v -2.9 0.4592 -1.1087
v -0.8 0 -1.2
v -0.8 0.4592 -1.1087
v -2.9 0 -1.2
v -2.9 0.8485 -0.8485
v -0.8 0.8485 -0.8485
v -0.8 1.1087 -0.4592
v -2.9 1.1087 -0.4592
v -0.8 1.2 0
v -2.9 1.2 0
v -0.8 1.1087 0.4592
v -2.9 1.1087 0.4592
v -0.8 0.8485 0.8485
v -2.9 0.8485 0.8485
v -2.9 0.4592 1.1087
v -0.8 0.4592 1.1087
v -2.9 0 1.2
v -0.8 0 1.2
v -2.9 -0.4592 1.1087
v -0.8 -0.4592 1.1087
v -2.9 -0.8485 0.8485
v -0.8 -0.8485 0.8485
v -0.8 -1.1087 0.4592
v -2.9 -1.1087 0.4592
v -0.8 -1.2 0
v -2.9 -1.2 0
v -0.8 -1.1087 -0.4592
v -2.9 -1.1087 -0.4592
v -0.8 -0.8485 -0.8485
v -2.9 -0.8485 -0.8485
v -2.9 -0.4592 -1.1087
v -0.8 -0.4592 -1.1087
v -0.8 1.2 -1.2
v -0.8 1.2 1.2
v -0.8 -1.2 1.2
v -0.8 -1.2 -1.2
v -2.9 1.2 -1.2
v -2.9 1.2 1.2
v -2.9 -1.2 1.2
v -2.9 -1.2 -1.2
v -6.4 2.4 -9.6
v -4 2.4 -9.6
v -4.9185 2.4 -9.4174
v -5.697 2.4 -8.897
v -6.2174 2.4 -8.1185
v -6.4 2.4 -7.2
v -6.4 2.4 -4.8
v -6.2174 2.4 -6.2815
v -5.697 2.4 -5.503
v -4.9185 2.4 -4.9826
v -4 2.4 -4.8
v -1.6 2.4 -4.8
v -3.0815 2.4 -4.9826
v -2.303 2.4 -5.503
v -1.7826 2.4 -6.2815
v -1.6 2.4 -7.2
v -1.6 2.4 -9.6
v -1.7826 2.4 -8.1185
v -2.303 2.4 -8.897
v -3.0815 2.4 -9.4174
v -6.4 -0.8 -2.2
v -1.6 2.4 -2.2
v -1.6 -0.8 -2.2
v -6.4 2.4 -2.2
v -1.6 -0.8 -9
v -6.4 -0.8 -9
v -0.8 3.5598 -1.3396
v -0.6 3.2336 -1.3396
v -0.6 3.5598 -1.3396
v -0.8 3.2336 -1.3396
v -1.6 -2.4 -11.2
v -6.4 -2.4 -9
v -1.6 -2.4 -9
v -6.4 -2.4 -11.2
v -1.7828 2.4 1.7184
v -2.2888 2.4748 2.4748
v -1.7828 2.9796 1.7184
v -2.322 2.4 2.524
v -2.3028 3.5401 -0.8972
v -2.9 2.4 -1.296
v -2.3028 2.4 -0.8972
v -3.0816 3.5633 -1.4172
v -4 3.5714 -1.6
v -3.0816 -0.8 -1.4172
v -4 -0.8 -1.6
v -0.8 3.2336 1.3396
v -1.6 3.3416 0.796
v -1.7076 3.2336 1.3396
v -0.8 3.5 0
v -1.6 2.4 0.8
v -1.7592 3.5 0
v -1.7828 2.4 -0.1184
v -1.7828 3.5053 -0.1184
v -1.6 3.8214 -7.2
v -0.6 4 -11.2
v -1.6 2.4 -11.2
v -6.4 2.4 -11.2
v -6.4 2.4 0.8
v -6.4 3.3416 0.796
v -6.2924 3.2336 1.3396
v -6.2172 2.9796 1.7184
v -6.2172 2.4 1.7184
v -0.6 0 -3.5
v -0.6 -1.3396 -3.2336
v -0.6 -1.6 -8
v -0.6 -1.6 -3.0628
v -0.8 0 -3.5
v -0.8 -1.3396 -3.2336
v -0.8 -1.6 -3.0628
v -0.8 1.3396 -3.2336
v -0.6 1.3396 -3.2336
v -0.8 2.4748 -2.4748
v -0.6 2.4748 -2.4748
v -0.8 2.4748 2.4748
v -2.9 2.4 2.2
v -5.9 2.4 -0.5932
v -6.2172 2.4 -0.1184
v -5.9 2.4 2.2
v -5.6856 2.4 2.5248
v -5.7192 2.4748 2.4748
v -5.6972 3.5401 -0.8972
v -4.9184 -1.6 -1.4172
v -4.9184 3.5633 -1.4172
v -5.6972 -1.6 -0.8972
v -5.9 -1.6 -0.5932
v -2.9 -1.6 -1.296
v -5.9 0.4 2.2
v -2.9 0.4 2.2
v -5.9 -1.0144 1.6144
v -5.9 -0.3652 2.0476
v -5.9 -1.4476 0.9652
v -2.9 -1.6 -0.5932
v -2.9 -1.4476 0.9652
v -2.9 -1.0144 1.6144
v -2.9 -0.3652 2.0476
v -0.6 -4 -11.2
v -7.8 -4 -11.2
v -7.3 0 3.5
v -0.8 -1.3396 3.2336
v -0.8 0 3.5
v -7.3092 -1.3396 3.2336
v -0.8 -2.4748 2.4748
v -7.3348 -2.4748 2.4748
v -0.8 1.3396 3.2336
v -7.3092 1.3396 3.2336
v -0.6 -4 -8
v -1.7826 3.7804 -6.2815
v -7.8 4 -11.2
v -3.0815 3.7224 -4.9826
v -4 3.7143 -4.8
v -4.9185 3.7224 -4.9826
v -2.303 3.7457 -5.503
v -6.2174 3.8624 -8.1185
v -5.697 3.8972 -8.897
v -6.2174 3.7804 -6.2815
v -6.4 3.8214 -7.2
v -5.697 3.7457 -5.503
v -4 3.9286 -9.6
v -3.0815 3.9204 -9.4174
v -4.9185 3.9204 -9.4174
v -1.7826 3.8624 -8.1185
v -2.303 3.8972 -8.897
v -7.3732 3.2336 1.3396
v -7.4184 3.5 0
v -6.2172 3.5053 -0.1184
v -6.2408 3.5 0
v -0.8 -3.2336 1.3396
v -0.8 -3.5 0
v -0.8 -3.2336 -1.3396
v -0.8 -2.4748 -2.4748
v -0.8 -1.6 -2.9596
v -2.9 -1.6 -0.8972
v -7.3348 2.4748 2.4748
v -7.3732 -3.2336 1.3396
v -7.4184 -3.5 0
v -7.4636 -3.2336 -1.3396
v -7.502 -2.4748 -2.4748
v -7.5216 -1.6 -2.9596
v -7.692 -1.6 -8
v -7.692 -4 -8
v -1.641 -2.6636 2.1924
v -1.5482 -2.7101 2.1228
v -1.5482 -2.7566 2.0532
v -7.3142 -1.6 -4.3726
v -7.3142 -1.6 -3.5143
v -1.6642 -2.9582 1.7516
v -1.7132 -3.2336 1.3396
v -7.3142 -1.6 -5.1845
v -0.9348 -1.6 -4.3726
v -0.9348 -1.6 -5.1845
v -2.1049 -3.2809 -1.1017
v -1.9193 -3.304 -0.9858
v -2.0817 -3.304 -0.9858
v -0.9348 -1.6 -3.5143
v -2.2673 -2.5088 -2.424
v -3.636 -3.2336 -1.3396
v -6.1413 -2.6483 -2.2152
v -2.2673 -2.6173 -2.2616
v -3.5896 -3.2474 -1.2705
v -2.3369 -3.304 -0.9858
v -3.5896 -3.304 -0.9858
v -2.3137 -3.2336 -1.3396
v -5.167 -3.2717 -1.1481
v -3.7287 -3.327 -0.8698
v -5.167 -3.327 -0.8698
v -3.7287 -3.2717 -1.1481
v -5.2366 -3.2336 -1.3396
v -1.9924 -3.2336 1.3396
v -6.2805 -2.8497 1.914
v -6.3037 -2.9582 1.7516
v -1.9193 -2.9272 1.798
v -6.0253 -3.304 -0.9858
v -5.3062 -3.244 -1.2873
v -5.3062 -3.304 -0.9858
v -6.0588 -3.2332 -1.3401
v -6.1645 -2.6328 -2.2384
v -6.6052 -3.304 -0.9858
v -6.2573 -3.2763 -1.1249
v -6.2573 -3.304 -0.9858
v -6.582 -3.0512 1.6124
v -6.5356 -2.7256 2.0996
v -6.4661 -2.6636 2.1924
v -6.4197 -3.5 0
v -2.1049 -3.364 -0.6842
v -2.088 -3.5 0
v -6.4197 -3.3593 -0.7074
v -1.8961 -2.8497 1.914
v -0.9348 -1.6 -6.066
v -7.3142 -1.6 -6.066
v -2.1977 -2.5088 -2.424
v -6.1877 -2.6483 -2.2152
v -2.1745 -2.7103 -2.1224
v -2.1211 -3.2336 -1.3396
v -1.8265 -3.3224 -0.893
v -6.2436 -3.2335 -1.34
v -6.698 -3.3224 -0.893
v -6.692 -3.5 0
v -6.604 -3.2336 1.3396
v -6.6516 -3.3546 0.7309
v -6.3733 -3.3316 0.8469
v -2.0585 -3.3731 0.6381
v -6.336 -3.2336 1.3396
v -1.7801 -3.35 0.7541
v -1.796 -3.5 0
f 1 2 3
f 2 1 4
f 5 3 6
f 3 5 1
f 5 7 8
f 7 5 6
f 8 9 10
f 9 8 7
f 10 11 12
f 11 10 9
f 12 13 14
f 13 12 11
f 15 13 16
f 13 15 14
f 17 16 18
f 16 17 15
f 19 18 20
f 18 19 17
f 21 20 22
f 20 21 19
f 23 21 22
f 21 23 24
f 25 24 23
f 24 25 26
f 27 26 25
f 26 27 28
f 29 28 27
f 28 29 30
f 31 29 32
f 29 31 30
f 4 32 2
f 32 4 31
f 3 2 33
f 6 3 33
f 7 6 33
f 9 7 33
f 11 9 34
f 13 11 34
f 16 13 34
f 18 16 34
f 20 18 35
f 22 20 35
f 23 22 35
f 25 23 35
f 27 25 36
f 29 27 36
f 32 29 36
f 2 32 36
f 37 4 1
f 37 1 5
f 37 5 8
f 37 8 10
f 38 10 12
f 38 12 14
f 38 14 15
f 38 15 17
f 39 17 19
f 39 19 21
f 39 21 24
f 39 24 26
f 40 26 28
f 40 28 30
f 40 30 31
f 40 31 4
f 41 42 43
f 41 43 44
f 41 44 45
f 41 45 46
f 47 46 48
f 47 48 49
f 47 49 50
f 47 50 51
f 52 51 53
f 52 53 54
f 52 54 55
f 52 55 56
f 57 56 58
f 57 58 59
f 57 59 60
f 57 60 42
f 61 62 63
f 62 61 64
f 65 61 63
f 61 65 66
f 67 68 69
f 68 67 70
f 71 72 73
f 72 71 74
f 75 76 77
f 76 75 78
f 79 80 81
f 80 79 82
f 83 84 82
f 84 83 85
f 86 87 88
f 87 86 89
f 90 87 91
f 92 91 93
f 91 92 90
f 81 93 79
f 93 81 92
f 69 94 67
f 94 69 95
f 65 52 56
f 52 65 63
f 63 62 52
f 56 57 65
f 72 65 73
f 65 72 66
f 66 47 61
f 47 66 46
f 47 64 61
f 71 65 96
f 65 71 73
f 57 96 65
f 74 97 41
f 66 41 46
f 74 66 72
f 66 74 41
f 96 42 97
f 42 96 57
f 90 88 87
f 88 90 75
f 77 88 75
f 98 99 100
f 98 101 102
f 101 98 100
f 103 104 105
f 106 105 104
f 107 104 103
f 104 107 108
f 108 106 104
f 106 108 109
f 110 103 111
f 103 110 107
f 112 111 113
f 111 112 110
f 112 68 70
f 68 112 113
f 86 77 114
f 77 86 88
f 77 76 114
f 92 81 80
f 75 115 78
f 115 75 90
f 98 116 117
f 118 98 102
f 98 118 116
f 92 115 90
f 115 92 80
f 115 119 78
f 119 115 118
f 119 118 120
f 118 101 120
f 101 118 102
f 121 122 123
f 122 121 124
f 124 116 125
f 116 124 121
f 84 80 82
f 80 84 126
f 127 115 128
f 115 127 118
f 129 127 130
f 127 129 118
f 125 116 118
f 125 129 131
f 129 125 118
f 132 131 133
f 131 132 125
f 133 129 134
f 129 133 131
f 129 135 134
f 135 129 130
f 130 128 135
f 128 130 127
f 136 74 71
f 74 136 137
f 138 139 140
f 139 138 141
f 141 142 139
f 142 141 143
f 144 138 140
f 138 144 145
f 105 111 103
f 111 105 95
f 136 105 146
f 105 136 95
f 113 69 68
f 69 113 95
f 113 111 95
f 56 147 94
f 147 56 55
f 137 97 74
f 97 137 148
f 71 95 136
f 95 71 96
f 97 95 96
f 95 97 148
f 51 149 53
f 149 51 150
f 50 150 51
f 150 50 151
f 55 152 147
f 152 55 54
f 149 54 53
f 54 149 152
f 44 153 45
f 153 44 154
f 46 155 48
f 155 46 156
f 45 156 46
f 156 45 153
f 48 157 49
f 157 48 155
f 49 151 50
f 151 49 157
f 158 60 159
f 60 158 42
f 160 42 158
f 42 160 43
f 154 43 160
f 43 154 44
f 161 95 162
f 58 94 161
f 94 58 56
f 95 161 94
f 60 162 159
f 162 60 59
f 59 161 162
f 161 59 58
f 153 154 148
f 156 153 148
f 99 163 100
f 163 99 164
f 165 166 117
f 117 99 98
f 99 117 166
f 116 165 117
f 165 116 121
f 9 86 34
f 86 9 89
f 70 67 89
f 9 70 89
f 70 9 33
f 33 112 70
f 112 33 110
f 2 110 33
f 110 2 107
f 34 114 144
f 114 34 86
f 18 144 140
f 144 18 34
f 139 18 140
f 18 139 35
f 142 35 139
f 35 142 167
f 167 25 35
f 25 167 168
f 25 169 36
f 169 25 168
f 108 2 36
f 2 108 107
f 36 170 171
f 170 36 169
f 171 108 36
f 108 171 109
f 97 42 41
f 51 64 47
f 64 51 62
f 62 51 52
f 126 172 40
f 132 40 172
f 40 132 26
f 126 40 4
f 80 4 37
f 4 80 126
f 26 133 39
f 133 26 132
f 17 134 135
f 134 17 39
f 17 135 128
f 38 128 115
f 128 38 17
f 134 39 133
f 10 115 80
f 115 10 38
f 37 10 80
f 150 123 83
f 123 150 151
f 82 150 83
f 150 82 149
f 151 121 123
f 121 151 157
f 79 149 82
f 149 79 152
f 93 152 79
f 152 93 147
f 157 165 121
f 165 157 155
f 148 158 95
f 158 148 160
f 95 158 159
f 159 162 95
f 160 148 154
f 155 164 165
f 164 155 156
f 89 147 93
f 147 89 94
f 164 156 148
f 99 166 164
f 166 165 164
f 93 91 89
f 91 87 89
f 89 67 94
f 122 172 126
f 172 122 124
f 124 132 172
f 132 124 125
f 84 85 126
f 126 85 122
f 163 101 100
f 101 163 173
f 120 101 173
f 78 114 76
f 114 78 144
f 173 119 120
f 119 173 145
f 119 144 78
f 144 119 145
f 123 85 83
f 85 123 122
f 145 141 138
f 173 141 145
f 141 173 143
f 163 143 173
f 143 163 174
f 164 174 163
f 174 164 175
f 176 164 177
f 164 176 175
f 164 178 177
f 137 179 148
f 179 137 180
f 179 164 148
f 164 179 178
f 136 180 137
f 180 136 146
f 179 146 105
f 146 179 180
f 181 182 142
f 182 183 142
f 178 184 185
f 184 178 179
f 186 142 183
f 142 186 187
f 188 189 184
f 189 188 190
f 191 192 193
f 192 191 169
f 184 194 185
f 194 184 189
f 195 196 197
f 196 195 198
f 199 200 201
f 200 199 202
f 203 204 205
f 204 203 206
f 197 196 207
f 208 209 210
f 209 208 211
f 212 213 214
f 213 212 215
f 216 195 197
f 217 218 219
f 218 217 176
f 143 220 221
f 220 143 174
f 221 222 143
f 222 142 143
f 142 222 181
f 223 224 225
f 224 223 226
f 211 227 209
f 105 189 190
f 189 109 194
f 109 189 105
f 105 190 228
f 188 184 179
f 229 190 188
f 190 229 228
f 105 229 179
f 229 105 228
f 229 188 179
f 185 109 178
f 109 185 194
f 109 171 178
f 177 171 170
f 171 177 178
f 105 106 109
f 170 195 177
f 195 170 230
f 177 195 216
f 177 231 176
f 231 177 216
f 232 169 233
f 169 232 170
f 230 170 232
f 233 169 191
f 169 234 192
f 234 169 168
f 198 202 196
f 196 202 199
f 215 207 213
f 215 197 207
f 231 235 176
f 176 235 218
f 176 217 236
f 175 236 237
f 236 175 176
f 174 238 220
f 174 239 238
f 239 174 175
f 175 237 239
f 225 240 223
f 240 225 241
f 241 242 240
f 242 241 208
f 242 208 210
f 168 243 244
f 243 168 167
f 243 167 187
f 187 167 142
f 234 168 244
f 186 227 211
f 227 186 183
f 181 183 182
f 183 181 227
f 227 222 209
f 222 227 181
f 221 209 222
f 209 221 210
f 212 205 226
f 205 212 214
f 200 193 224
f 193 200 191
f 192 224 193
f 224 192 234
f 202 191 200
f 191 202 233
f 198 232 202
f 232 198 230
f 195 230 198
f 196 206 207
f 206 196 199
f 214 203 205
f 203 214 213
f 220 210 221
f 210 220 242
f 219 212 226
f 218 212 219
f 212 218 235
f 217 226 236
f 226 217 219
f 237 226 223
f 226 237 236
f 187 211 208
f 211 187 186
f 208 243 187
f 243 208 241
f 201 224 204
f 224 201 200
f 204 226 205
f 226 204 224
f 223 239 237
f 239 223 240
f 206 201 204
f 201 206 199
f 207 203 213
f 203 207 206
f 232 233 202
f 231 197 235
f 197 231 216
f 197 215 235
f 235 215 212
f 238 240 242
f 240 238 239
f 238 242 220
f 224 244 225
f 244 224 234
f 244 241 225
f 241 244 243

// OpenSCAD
use <../lib.scad>
use <3817bp71.scad>
function ldraw_lib__3816bp71() = [
// 0 ~Minifig Leg Right with Reflective Stripes and Tan Pocket Outline Pattern (Obsolete)
// 0 Name: 3816bp71.dat
// 0 Author: Philippe Hurbain [Philo]
// 0 !LDRAW_ORG Part UPDATE 2023-03
// 0 !LICENSE Licensed under CC BY 4.0 : see CAreadme.txt
// 
// 0 BFC CERTIFY CCW
  [0,"BFC","CERTIFY"],
  [0,"BFC","CCW"],
// 
// 0 !KEYWORDS Bricklink 970c00pb0160, Set 60321
// 
// 0 !HISTORY 2020-06-28 [PTadmin] Official Update 2020-01
// 0 !HISTORY 2023-05-03 [Holly-Wood] Obsoleted due to bad geometry
// 0 !HISTORY 2023-06-24 [OrionP] Official Update 2023-03
// 
// 
// 1 16 0 0 0 -1 0 0 0 1 0 0 0 1 3817bp71.dat
  [1,16,0,0,0,-1,0,0,0,1,0,0,0,1, ldraw_lib__3817bp71()],
];
module ldraw_lib__3816bp71(step=0, col=false, unit=2/5, alt=false, line=0.2, solid=!$preview)
    makepoly(ldraw_lib__3816bp71(), step=step, col=col, unit=unit, alt=alt, line=line, solid=solid);
ldraw_lib__3816bp71(line=0.2);
